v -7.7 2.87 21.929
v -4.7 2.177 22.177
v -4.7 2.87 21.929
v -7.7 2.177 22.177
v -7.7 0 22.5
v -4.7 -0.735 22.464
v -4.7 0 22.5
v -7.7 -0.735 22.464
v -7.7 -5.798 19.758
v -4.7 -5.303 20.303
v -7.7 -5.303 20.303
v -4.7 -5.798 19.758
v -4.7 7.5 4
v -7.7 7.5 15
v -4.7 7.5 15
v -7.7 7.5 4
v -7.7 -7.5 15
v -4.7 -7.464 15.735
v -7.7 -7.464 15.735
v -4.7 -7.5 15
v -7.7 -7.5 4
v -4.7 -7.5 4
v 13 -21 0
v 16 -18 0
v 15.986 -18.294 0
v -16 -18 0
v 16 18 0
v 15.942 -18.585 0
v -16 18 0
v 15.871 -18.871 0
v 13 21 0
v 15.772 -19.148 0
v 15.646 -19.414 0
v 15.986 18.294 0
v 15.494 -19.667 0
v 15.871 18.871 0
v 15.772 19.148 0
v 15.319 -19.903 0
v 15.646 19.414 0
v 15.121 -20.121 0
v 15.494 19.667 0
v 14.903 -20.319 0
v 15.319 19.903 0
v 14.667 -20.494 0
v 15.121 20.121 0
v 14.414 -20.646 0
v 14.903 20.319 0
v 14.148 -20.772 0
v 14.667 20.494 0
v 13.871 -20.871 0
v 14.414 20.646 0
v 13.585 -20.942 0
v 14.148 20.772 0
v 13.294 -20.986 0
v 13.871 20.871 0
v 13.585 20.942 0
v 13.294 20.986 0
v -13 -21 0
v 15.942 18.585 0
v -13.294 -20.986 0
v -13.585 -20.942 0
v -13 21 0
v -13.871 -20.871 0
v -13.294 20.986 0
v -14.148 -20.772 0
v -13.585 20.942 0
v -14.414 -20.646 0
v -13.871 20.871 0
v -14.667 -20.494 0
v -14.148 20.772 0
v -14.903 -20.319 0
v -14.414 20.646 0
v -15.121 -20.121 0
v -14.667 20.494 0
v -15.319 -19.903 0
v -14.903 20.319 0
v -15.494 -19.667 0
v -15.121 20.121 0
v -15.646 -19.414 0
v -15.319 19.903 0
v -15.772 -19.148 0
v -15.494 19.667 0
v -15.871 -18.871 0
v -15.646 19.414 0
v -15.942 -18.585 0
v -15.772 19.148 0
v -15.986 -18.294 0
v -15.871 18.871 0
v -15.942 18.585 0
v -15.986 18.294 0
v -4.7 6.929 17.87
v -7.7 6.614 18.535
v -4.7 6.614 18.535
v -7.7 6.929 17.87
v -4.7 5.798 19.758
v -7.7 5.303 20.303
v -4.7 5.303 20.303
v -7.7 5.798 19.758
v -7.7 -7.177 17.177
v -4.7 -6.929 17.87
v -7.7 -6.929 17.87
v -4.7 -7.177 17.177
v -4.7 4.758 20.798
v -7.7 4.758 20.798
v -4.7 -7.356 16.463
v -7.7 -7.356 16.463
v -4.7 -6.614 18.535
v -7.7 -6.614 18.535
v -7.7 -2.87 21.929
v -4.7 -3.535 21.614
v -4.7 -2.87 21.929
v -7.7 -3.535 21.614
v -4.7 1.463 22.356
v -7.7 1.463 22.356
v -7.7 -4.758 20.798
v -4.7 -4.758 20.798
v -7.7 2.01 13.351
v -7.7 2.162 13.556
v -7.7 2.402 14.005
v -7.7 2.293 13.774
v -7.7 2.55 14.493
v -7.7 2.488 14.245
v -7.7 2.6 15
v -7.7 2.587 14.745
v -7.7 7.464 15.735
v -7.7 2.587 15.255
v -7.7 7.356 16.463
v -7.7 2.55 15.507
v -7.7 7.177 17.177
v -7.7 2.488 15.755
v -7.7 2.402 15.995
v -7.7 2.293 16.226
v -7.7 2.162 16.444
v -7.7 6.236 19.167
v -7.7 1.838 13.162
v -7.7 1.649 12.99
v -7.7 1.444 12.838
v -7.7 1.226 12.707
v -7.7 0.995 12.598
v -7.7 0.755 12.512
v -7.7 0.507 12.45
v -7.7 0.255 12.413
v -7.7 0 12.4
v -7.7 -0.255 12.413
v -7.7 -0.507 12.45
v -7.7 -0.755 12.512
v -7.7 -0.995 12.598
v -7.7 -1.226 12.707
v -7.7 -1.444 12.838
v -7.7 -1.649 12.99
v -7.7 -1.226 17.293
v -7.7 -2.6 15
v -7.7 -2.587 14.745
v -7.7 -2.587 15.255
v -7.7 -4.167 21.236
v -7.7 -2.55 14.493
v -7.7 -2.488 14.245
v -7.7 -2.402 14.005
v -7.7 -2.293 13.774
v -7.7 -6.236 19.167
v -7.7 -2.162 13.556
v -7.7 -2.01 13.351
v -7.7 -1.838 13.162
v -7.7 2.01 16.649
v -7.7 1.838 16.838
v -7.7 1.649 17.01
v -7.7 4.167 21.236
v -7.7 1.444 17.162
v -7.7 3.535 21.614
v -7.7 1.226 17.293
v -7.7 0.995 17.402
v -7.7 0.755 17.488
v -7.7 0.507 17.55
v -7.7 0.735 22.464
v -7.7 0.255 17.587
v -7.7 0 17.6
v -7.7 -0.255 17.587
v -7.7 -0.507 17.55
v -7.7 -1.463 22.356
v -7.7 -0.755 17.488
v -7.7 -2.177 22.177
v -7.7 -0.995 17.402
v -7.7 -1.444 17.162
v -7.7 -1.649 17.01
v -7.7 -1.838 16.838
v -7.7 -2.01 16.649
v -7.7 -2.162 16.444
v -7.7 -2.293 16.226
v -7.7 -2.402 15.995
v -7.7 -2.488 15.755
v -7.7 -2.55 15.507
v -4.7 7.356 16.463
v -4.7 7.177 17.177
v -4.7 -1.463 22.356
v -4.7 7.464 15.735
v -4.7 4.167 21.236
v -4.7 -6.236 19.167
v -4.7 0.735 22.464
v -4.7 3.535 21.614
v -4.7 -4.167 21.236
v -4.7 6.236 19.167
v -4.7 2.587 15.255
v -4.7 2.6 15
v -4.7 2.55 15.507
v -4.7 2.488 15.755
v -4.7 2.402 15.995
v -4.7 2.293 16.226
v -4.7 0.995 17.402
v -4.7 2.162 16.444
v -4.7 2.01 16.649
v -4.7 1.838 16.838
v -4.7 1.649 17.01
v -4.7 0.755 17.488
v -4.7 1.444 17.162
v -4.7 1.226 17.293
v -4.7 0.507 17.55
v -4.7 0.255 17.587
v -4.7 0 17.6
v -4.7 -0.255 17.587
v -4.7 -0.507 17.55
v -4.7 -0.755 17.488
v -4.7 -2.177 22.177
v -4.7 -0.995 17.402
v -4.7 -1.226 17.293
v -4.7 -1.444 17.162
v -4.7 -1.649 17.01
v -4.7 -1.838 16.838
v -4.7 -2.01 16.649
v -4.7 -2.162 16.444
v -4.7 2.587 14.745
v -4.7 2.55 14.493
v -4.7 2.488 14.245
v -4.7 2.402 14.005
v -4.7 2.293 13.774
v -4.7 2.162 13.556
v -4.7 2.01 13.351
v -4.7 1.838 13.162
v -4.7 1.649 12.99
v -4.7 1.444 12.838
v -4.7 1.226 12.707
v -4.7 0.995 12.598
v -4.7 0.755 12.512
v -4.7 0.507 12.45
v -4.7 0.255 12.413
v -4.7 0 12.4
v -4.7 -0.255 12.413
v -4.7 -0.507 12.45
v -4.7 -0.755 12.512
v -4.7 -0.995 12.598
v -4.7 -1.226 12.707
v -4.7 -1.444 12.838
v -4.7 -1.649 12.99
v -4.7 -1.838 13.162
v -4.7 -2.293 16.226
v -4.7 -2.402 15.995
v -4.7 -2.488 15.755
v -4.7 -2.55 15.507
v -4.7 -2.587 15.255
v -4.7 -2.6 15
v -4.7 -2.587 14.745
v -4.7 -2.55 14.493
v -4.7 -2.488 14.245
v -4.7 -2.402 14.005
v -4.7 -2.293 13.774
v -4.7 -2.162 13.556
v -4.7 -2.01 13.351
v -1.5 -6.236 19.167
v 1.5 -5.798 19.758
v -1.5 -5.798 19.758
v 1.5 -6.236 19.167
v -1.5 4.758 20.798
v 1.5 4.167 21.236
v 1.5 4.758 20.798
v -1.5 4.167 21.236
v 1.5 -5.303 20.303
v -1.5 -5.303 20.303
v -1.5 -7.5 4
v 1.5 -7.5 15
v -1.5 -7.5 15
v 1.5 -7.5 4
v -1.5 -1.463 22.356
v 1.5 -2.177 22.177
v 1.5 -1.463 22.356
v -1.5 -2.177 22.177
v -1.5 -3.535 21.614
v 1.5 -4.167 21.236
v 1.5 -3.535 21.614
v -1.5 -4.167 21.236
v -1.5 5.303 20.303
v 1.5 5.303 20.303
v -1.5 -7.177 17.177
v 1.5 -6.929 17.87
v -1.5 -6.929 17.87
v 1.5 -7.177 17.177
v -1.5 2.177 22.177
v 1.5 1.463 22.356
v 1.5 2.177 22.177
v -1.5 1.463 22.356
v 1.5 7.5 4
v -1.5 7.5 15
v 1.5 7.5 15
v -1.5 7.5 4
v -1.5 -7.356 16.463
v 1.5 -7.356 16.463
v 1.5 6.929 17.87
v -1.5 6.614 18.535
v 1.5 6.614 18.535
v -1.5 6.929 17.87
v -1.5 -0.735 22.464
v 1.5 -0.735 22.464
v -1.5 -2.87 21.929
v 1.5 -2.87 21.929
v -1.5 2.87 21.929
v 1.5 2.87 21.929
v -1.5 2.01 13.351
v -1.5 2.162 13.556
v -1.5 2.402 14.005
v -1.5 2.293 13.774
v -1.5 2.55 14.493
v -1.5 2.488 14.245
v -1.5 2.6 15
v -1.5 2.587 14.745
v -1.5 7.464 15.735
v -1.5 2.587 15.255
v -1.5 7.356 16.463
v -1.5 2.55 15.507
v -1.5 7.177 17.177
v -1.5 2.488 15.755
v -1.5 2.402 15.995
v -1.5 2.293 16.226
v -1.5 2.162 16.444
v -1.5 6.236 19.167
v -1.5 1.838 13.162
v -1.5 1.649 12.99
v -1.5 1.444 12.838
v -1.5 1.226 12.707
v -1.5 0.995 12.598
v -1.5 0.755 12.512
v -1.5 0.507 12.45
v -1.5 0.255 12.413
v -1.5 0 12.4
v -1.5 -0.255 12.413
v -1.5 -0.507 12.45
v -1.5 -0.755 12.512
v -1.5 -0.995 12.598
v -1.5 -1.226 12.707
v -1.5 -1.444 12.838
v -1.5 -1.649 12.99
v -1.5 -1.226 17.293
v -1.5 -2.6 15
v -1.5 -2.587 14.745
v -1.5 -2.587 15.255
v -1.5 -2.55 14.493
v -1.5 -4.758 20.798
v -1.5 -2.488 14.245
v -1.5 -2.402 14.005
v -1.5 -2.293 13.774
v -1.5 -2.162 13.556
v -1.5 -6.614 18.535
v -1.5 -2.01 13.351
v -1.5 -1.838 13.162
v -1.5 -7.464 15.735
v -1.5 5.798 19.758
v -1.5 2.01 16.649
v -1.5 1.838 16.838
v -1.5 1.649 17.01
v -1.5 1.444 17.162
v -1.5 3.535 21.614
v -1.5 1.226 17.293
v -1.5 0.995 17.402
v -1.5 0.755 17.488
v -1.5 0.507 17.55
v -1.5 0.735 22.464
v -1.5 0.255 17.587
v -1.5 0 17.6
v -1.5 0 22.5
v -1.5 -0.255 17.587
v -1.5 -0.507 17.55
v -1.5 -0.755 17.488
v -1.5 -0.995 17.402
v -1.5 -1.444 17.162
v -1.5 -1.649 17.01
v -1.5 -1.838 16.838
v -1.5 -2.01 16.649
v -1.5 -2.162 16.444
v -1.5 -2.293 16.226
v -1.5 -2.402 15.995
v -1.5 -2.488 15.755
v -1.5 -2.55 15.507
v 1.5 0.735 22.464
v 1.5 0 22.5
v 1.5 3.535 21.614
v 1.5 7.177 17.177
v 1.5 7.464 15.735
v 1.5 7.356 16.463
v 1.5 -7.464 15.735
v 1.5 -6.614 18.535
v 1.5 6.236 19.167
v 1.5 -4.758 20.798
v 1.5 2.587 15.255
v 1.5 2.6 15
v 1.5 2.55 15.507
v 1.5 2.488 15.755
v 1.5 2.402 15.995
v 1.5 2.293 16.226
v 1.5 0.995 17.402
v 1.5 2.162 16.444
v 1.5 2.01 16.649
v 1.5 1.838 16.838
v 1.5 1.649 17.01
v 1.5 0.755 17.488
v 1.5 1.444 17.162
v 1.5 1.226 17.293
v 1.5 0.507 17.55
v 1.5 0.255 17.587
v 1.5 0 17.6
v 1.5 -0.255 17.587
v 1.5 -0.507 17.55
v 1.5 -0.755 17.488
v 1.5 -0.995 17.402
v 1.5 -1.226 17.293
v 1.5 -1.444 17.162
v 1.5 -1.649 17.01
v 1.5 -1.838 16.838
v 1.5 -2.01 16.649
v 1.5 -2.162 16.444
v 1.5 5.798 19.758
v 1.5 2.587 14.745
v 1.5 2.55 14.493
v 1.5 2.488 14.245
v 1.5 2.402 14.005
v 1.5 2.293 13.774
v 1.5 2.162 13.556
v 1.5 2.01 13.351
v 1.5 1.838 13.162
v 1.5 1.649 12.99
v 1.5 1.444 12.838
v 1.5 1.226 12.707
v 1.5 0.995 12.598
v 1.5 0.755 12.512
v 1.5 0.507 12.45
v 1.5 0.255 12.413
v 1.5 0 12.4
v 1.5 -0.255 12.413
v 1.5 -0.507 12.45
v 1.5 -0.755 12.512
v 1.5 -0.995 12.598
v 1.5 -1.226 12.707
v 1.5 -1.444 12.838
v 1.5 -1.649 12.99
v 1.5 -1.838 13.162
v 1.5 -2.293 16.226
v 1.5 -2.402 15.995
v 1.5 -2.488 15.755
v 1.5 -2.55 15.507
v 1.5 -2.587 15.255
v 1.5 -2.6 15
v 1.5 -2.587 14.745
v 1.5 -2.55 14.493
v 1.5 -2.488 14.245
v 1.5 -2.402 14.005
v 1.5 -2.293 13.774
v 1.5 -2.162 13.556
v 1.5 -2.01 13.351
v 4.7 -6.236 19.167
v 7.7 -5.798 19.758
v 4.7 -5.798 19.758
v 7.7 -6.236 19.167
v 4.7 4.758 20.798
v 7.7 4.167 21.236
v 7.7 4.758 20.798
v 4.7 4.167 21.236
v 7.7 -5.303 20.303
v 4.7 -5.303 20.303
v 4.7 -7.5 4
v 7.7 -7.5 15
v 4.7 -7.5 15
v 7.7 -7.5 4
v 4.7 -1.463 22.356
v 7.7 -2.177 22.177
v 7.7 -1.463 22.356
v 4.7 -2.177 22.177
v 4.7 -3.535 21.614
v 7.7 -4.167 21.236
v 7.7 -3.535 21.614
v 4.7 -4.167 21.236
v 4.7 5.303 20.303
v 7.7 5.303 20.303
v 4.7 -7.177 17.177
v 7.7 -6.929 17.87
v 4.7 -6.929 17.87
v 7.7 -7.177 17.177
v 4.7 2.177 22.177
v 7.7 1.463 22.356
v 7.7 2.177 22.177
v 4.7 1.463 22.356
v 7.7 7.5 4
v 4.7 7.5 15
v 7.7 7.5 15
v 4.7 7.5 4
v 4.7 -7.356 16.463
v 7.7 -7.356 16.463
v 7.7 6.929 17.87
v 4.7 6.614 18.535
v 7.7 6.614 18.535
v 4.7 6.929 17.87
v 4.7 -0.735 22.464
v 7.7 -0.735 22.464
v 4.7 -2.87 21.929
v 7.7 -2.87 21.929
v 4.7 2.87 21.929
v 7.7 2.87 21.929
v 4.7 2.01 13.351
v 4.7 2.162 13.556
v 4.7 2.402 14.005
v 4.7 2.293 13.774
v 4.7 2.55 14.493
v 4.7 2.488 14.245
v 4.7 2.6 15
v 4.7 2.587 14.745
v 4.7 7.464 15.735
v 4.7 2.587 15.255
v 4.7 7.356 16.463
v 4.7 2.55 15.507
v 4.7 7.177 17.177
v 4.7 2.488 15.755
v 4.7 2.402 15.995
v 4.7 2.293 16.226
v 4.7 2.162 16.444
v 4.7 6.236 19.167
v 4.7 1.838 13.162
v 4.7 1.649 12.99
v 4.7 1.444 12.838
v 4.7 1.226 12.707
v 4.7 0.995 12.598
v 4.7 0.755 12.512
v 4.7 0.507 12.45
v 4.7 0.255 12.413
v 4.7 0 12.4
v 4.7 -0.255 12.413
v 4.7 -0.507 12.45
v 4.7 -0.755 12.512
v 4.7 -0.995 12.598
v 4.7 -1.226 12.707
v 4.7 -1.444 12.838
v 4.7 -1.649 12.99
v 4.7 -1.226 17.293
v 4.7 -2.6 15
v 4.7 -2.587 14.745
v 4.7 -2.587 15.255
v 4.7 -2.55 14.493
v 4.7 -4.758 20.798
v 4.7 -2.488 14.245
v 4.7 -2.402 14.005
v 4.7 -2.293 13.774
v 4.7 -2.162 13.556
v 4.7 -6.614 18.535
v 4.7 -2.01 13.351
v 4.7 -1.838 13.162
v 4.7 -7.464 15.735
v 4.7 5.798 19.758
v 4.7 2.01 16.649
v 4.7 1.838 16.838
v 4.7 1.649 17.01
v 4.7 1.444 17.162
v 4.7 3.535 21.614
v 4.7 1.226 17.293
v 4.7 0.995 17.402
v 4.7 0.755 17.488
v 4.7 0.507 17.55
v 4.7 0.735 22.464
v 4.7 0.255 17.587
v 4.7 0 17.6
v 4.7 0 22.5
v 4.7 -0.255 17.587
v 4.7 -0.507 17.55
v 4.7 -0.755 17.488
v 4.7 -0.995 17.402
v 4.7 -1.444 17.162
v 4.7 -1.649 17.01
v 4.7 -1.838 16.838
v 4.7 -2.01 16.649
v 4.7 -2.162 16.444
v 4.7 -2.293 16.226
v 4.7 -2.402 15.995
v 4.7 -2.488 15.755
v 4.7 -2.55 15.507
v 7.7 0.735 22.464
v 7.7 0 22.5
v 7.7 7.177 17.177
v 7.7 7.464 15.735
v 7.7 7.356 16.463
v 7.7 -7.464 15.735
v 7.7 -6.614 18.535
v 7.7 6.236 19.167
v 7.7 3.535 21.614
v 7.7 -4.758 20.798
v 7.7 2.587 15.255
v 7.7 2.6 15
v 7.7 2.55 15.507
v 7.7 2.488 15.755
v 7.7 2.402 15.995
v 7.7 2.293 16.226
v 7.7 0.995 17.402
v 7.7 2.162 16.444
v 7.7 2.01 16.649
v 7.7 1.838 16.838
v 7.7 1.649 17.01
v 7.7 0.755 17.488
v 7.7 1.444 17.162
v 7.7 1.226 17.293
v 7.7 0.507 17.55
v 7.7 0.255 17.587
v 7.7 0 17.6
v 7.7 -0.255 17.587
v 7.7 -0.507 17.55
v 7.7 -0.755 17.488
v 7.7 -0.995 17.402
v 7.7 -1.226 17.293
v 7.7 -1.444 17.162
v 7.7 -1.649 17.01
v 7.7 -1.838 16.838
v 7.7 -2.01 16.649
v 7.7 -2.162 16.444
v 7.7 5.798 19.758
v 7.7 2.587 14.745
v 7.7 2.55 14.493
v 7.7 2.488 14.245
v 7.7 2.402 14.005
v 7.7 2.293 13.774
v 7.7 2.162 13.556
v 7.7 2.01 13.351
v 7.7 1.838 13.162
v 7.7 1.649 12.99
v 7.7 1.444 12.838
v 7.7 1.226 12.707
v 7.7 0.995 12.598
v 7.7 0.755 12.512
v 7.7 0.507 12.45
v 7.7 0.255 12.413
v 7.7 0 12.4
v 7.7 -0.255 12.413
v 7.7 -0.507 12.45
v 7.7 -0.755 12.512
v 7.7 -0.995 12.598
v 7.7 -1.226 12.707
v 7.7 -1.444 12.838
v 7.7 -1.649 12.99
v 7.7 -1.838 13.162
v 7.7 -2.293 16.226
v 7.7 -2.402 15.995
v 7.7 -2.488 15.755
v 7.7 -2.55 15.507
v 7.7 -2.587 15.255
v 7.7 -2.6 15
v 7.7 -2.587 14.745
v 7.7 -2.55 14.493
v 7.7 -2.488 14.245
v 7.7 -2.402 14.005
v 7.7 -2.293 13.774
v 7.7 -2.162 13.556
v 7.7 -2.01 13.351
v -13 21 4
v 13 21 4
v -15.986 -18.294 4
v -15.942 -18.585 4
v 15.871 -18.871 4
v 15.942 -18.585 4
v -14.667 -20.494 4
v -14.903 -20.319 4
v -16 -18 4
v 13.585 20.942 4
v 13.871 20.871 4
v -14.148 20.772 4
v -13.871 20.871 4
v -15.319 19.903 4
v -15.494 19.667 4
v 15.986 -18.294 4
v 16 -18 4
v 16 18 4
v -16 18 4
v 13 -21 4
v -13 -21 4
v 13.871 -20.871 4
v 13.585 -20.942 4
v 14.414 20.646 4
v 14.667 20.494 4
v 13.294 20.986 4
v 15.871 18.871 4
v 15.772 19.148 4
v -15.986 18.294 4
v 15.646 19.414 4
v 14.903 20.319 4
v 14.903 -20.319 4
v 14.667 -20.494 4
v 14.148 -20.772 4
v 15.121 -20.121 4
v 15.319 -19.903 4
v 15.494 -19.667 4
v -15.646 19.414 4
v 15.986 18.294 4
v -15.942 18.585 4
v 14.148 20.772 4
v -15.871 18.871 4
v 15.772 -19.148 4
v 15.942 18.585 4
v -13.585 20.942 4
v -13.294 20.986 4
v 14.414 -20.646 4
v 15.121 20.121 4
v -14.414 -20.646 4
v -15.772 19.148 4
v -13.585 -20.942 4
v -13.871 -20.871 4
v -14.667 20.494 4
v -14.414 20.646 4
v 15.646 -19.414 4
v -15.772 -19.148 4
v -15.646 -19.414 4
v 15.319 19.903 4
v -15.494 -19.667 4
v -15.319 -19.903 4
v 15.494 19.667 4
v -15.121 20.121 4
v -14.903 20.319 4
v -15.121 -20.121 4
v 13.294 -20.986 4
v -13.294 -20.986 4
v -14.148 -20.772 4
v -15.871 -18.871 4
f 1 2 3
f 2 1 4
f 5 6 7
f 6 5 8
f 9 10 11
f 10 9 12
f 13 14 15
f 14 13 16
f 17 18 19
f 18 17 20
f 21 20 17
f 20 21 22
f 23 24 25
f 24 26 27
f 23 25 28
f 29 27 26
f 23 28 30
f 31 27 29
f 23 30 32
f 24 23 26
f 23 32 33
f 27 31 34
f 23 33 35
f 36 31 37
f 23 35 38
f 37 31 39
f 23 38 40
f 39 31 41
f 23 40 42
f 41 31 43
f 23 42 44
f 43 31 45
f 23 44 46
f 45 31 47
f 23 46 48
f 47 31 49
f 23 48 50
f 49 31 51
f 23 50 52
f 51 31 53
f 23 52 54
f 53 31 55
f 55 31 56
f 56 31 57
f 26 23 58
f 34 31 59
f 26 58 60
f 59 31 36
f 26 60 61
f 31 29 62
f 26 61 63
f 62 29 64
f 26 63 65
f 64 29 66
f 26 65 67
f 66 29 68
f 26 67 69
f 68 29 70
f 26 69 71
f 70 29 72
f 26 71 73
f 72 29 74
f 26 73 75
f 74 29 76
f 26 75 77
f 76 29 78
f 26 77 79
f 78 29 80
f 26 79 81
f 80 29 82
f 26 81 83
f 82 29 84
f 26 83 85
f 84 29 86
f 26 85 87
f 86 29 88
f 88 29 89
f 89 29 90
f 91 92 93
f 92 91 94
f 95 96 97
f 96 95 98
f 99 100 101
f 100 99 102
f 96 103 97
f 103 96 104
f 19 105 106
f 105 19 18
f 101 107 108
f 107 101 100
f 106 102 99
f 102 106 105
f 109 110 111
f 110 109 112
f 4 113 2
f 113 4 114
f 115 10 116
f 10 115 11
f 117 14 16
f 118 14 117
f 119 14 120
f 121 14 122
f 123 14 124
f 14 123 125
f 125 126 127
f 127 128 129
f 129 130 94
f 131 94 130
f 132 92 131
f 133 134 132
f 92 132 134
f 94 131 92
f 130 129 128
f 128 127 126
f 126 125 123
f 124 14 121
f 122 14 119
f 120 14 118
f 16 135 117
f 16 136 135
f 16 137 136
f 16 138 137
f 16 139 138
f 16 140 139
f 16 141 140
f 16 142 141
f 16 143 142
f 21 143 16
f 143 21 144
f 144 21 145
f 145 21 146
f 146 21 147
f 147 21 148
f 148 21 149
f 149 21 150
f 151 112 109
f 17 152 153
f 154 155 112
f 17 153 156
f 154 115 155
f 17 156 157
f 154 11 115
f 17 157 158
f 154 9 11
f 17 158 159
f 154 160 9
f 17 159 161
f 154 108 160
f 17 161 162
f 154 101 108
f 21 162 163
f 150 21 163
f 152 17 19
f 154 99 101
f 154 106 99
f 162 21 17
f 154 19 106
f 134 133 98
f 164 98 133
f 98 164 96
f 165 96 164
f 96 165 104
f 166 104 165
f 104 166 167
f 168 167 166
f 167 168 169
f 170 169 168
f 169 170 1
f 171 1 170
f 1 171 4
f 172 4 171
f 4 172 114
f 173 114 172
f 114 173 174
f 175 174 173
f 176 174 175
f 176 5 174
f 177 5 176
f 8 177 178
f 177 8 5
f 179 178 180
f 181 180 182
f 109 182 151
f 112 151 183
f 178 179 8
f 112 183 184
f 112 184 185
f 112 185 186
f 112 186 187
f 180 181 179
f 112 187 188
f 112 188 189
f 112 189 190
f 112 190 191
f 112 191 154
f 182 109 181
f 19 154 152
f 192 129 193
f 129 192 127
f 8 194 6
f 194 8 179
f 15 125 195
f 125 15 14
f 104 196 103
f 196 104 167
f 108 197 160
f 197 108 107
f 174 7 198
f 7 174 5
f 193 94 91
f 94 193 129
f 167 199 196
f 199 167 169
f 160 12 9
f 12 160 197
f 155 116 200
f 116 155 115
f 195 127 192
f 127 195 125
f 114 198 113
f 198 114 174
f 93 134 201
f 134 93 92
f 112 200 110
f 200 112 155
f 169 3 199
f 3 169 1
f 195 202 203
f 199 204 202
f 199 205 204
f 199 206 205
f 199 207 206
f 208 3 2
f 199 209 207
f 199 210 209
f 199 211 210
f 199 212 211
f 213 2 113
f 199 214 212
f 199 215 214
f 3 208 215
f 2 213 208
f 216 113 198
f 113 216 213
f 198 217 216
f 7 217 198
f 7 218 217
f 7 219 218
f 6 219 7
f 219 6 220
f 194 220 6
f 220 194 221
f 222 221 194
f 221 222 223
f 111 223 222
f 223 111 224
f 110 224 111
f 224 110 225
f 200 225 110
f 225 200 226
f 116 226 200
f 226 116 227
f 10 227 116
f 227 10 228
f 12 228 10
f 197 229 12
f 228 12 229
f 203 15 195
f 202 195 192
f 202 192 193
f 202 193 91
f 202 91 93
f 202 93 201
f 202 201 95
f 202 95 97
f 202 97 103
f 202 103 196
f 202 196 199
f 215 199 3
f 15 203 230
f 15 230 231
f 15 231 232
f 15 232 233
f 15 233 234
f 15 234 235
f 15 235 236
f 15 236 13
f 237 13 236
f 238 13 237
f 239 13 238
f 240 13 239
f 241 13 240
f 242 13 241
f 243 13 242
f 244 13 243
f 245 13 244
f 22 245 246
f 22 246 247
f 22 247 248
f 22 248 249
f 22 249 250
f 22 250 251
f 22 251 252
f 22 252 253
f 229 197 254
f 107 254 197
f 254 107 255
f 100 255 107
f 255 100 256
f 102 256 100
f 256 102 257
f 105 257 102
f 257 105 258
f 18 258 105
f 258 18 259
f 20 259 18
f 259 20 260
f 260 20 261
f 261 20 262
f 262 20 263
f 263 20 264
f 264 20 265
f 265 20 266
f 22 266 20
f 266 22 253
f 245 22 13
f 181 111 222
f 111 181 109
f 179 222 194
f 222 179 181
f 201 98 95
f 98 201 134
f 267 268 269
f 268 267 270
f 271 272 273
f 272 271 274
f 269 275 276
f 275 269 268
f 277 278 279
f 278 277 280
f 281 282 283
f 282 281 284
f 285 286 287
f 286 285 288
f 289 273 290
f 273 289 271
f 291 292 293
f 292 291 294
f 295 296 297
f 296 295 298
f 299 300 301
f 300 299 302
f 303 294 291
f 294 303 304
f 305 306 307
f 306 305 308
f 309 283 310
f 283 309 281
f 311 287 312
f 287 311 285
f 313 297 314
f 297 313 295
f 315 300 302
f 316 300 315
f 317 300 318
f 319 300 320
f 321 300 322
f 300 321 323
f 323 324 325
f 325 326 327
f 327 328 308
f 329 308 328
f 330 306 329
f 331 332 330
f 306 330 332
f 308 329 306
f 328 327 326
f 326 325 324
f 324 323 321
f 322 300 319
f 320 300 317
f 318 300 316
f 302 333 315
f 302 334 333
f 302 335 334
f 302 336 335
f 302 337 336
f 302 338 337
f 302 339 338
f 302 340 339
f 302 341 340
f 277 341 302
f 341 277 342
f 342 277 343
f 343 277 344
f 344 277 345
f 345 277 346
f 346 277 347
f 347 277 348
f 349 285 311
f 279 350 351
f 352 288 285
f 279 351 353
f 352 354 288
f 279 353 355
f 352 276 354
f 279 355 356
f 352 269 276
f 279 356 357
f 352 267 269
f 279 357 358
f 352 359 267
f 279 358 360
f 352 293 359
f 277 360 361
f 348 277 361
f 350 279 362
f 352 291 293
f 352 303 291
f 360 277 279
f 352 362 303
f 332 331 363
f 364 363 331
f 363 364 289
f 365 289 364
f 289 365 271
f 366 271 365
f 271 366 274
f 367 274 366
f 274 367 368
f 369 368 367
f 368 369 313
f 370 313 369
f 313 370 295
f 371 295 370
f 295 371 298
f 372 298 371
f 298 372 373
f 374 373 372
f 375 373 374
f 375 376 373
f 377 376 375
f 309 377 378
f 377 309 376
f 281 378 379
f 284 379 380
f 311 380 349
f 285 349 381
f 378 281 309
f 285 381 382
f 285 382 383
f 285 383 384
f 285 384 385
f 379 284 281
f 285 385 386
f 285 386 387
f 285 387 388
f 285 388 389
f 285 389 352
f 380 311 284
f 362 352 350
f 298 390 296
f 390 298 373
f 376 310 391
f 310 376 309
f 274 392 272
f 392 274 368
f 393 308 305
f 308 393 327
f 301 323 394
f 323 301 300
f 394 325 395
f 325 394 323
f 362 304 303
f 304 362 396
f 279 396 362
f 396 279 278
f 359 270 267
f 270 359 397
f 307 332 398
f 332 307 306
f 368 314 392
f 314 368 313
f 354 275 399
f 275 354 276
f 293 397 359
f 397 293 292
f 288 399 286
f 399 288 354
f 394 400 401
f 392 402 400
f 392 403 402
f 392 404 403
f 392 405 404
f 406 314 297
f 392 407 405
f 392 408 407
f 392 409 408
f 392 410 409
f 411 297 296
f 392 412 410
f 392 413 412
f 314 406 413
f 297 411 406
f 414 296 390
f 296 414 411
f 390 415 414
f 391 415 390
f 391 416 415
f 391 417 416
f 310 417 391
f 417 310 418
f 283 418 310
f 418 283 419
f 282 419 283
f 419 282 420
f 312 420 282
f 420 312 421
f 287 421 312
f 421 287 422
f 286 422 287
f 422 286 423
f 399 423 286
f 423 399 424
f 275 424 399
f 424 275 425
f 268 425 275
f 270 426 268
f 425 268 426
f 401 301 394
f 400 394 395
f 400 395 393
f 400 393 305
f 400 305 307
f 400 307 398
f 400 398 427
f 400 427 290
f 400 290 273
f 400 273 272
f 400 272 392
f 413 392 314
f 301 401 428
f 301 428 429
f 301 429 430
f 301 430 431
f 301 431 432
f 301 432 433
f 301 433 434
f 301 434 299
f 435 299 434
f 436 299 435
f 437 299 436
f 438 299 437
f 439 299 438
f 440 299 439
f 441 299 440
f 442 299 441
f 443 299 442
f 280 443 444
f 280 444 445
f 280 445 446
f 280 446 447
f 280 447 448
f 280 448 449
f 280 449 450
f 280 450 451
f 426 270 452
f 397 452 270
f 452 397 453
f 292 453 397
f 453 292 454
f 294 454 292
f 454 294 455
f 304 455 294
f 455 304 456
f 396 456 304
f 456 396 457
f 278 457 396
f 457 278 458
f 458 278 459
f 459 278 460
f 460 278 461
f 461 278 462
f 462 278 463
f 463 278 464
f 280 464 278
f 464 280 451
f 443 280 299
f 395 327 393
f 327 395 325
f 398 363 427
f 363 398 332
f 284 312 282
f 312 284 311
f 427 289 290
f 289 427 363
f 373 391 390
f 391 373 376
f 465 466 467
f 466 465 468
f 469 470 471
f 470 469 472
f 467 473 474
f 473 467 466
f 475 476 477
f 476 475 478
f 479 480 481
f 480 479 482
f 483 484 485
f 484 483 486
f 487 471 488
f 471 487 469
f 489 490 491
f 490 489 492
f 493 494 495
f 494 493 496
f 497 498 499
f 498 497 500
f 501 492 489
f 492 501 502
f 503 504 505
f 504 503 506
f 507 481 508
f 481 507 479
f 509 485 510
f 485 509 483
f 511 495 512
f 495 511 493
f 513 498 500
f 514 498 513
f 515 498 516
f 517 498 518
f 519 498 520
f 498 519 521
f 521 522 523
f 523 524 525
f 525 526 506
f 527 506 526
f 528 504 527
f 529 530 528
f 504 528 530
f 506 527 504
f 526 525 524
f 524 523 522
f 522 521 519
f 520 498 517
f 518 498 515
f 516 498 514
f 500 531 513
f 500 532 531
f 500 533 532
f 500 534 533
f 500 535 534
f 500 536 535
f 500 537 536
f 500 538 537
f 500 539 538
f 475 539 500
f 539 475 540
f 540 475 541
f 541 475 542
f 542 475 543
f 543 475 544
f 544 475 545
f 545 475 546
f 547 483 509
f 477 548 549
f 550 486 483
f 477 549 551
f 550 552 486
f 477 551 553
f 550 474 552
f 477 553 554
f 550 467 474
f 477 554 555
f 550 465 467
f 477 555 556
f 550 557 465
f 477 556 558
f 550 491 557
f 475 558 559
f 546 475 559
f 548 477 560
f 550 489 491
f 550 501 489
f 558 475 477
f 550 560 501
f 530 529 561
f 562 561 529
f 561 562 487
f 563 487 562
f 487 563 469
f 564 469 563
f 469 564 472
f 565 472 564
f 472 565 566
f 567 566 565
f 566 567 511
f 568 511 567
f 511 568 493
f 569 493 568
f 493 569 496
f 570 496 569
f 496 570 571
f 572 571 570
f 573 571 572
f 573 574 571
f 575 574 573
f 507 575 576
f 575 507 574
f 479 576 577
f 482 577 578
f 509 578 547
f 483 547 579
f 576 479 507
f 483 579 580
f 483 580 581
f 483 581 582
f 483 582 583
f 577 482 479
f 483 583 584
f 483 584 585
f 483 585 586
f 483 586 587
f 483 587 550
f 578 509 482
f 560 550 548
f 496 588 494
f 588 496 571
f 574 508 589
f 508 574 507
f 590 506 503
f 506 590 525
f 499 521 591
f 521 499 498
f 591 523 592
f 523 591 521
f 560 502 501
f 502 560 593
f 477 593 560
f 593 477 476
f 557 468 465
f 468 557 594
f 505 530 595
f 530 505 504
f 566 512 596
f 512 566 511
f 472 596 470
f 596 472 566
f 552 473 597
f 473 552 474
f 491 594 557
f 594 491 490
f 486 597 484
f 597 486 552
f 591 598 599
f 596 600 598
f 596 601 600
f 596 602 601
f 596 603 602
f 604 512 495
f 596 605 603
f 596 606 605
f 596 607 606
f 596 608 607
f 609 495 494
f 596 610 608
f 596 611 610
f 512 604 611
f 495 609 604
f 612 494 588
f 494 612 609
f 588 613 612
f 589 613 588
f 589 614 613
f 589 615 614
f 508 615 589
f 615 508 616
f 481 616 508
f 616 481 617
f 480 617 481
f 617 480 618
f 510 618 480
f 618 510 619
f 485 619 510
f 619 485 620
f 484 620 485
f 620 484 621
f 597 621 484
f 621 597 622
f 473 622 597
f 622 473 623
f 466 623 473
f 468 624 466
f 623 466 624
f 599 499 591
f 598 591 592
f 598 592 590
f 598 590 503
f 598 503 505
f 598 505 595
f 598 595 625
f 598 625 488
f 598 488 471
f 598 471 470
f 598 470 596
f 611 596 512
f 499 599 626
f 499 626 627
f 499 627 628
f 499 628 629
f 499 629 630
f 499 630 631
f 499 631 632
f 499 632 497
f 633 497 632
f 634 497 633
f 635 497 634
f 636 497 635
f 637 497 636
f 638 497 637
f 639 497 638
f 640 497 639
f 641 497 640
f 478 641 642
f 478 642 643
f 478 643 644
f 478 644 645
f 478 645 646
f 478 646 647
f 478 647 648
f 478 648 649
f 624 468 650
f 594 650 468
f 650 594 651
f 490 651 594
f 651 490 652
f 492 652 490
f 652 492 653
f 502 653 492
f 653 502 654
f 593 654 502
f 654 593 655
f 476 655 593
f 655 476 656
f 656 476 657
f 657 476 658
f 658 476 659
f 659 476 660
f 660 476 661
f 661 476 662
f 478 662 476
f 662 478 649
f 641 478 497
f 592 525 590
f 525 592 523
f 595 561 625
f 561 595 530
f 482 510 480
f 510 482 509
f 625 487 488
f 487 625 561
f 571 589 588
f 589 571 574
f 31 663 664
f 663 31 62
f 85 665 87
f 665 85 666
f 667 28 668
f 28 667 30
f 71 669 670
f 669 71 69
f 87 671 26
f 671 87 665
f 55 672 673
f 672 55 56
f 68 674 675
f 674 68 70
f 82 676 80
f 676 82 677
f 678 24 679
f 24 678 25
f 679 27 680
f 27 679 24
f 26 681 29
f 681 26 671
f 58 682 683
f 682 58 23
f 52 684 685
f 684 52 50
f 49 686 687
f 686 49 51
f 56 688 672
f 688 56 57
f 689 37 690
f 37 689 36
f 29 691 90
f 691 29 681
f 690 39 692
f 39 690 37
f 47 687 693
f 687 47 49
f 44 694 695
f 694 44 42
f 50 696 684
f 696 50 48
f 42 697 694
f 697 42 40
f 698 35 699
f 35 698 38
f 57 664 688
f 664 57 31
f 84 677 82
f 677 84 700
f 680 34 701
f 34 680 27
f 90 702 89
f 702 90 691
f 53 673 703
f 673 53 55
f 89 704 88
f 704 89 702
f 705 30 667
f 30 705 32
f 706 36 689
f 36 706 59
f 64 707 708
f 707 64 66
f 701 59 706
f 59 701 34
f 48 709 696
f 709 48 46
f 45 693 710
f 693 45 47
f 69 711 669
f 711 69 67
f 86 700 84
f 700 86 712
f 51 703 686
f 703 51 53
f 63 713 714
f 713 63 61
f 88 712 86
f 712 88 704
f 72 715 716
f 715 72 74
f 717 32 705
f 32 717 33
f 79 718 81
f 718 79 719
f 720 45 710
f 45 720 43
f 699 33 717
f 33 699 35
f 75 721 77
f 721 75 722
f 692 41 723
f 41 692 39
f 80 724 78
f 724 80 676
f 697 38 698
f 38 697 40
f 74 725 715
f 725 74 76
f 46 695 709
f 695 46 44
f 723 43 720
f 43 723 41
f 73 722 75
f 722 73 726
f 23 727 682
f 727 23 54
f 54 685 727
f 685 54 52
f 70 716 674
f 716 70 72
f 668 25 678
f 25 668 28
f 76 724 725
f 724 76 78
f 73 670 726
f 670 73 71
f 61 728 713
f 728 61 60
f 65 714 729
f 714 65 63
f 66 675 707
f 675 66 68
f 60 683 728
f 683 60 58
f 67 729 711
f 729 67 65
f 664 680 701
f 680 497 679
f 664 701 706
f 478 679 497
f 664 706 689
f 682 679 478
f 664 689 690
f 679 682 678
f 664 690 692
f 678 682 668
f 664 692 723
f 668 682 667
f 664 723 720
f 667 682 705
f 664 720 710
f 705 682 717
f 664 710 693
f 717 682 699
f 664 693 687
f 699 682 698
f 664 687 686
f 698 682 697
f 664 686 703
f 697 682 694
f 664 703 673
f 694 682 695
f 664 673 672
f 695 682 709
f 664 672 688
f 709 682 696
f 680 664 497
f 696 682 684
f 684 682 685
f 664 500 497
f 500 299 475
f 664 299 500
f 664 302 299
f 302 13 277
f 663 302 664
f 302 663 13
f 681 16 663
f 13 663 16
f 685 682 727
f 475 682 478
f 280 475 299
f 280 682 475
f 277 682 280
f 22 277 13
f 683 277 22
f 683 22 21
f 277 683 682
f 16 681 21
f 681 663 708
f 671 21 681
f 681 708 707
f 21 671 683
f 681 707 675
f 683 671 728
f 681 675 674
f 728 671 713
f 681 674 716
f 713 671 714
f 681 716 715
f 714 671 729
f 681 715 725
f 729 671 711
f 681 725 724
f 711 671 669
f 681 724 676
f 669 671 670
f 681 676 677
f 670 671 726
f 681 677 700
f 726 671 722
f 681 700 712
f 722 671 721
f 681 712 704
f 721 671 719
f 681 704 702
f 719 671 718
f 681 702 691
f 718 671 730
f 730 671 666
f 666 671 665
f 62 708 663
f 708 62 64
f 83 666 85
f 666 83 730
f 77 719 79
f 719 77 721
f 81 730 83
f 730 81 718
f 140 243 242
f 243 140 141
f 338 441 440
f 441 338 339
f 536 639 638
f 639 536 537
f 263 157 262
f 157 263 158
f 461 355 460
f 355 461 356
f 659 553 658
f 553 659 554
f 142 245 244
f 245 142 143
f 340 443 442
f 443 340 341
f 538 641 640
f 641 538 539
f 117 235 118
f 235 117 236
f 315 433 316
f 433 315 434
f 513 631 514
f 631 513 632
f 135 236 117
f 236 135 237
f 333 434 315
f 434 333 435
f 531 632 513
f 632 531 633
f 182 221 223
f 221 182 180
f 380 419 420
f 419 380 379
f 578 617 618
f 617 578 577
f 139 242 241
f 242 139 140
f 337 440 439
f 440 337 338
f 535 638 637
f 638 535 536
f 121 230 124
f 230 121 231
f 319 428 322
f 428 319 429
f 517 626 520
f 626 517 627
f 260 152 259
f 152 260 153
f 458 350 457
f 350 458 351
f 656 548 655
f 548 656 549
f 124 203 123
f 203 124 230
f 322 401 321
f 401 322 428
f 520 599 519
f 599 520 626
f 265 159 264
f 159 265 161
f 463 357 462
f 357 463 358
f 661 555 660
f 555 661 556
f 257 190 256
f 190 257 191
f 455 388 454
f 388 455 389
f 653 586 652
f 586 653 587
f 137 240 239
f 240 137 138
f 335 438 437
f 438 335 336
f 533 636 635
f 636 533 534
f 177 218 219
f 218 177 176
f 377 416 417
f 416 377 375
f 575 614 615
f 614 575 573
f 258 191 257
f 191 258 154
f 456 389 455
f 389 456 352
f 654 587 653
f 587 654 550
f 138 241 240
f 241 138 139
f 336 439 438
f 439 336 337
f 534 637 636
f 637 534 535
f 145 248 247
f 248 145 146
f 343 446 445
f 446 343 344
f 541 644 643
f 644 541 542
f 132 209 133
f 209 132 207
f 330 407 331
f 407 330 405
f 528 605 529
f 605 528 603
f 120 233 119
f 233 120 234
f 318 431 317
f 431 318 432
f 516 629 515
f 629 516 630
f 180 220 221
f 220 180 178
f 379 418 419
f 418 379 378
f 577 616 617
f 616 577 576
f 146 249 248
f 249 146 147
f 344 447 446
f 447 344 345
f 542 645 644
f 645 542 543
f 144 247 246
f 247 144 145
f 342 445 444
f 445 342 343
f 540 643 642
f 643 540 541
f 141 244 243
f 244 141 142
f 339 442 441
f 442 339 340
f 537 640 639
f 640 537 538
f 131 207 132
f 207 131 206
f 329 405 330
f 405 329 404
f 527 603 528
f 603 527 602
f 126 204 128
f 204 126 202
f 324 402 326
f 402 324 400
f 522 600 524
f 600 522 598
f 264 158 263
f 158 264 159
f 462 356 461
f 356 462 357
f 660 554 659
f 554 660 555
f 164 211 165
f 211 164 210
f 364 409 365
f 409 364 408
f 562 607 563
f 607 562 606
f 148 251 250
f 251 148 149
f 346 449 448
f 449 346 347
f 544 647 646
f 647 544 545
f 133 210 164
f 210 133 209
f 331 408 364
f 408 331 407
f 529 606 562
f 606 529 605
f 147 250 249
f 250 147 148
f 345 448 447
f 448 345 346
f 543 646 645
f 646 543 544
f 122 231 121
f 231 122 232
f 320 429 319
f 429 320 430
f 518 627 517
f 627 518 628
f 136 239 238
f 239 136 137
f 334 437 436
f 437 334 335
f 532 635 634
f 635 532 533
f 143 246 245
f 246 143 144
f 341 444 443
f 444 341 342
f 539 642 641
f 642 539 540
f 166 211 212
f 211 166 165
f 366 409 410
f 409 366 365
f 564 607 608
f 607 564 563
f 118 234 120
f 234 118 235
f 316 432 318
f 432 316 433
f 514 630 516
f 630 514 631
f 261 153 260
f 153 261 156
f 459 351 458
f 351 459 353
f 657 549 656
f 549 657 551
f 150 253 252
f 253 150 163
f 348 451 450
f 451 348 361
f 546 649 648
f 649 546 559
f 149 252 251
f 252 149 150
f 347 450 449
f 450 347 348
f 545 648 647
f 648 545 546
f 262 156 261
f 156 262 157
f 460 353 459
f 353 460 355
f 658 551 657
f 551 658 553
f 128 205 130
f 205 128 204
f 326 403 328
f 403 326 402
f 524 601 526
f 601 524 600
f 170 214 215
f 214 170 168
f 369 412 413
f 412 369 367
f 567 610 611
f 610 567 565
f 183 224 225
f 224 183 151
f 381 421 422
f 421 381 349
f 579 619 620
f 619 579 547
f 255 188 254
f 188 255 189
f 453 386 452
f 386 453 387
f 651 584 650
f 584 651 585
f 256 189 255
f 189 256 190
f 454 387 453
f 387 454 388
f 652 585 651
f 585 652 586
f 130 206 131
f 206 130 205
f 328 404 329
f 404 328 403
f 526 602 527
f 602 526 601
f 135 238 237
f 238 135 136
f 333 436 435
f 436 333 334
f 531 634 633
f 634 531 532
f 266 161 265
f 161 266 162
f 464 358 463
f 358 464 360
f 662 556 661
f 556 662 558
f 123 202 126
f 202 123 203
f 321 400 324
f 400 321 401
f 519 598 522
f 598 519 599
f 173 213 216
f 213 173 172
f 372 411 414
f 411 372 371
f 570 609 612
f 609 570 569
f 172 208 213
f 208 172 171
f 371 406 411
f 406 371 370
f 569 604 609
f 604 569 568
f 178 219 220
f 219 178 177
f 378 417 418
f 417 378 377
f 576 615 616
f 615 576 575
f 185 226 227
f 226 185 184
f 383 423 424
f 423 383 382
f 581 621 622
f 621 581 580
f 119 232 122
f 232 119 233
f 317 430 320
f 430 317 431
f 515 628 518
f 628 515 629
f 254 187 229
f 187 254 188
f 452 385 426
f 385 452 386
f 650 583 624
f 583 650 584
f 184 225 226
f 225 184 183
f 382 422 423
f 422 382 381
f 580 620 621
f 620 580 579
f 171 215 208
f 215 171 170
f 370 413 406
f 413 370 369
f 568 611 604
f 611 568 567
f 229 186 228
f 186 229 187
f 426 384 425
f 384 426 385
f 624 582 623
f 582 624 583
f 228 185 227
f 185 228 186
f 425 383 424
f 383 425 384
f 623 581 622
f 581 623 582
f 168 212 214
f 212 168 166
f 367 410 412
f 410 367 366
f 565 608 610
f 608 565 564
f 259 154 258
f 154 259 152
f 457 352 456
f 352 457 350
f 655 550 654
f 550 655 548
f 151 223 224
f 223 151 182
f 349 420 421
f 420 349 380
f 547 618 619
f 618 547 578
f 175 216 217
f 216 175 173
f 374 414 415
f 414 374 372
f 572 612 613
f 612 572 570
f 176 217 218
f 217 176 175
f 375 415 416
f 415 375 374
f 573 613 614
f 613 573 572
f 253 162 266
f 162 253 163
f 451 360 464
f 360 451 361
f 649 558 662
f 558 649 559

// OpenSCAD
include <../common.scad>
buckle_w=32;                 // Visual approximation only; NOT a printable replacement.
buckle_l=42;
buckle_base=4;
buckle_ear=3;
buckle_gap=3.2;
buckle_axis=15;
buckle_r = 3;                // Planar corners of simplified buckle base.
buckle_ear_r = 7.5;          // Rounded ear envelope; measure the harness coupon.
buckle_bore = 5.2;
buckle_bore_length = 60;     // Boolean cutter spans entire buckle.
module gopro_buckle(){
 color([0.045,0.05,0.06])difference(){
 union(){centered_box([buckle_w,buckle_l,buckle_base],buckle_r);for(x=[-buckle_gap-buckle_ear,0,buckle_gap+buckle_ear])translate([x-buckle_ear/2,0,0])rotate([90,0,90])linear_extrude(buckle_ear)union(){translate([-buckle_ear_r,0])square([2*buckle_ear_r,buckle_axis]);translate([0,buckle_axis])circle(r=buckle_ear_r);}}
 translate([-buckle_bore_length/2,0,buckle_axis])rotate([0,90,0])cylinder(d=buckle_bore,h=buckle_bore_length);
 }
}
gopro_buckle();
